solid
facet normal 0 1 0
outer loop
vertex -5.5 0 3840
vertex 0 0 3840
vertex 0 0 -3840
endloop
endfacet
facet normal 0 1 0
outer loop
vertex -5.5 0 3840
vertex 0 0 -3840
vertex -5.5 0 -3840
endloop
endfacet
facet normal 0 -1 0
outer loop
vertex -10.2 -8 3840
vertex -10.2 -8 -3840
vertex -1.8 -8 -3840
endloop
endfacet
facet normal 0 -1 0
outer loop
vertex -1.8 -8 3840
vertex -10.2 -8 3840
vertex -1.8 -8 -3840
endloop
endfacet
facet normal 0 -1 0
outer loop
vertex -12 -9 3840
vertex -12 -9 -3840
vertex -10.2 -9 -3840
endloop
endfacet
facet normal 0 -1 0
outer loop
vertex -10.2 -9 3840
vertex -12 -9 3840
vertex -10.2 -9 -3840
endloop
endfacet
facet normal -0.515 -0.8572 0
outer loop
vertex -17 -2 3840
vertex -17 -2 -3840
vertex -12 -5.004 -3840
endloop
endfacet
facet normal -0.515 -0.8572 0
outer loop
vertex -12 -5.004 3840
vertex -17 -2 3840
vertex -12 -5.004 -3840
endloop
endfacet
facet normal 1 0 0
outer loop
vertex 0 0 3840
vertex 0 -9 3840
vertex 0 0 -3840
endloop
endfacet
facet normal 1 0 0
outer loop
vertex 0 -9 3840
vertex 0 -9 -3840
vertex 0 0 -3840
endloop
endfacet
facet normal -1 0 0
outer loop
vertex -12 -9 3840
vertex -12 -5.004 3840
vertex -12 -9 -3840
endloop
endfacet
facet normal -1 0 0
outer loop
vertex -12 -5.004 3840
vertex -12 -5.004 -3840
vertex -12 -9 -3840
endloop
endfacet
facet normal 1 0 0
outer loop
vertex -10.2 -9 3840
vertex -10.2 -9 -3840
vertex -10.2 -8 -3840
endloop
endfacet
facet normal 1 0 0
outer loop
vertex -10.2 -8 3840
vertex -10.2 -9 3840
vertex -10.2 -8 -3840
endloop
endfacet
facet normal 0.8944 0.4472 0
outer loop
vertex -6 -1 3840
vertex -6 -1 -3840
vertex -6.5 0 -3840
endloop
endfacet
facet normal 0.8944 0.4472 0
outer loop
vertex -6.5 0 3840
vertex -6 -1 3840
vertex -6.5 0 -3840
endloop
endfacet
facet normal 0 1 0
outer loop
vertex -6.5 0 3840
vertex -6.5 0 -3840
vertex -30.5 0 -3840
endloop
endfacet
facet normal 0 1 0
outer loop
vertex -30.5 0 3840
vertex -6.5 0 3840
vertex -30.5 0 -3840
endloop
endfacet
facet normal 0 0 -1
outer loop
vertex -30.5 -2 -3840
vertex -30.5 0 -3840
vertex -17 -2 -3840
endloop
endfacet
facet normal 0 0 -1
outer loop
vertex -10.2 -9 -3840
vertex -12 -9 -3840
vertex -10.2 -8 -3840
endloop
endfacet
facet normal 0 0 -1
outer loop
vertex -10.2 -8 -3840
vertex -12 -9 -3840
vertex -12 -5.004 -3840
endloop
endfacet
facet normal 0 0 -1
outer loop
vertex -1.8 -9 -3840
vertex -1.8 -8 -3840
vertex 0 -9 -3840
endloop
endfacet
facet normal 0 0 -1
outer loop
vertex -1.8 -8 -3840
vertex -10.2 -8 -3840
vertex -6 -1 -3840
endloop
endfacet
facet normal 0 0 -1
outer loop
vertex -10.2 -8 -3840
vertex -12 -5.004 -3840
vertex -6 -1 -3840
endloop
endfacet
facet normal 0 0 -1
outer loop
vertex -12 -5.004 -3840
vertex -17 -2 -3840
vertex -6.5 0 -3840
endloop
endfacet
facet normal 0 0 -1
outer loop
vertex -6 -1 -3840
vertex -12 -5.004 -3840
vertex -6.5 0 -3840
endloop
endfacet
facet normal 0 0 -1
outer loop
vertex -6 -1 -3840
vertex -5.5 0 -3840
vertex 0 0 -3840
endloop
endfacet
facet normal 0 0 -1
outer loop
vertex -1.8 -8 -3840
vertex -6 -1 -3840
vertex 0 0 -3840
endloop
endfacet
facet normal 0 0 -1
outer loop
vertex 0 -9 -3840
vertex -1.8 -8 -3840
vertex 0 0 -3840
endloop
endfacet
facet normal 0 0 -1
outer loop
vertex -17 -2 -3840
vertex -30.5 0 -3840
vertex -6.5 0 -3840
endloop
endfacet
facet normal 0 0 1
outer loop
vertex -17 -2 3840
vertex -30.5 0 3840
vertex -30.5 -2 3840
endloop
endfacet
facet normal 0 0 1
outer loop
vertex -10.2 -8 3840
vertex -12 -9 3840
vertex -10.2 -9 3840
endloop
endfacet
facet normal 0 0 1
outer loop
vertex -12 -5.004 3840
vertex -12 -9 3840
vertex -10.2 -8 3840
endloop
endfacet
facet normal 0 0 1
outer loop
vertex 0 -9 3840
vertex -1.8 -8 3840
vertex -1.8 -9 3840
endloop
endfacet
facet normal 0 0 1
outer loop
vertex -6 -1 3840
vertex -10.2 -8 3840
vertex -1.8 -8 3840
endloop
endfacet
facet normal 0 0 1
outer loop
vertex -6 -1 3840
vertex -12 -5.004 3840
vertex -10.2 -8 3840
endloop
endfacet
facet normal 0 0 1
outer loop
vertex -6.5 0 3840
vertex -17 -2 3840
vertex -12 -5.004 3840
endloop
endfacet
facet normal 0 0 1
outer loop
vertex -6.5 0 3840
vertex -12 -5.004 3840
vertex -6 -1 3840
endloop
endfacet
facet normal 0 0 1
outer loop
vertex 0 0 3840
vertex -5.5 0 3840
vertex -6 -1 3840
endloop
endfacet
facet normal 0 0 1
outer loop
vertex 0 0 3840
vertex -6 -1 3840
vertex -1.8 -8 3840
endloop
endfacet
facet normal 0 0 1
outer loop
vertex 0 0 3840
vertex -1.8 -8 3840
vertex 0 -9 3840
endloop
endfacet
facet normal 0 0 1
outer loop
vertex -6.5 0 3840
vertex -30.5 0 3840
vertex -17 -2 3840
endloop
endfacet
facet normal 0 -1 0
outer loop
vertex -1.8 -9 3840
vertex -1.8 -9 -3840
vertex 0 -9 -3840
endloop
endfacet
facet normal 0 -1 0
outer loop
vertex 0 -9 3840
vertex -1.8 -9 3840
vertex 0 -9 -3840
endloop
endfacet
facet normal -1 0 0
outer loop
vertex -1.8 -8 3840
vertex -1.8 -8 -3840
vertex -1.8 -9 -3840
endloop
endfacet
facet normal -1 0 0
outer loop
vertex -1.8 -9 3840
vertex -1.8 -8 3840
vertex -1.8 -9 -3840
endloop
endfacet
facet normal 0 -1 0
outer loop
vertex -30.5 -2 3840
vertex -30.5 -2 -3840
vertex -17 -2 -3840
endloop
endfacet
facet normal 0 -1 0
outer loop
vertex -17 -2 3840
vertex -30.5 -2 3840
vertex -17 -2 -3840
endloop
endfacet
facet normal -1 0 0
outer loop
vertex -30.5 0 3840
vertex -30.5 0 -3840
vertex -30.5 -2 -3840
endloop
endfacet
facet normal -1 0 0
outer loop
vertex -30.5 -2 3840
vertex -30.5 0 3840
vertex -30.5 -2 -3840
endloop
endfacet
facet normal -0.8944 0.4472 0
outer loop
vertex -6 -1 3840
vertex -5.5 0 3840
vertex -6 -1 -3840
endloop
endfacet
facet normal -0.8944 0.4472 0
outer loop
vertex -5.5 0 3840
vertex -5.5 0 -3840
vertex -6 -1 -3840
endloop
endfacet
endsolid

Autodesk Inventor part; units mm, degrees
ref_plane "YZ Plane" through (0, 0, 0) normal (1, 0, 0) x (0, 1, 0)
ref_plane "XZ Plane" through (0, 0, 0) normal (0, 1, 0) x (-1, 0, 0)
ref_plane "XY Plane" through (0, 0, 0) normal (0, 0, 1) x (1, 0, 0)
sketch "스케치9" plane through (0, 0, 0) normal (0, 0, 1) x (1, 0, 0)
  line L0 (-10.2, -9) -> (-10.2, -8)
  line L1 (-10.2, -8) -> (-1.8, -8)
  line L2 (-1.8, -8) -> (-1.8, -9)
  line L3 (-1.8, -9) -> (0, -9)
  line L4 (0, -9) -> (0, 0)
  line L5 (0, 0) -> (-5.5, 0)
  line L6 (-5.5, 0) -> (-6, -1)
  line L7 (-6, -1) -> (-6.5, 0)
  line L8 (-6.5, 0) -> (-30.5, 0)
  line L9 (-30.5, 0) -> (-30.5, -2)
  line L10 (-30.5, -2) -> (-17, -2)
  line L11 (-17, -2) -> (-12, -5.0043)
  line L12 (-12, -5.0043) -> (-12, -9)
  line L13 (-12, -9) -> (-10.2, -9)
  point P0 (0, 0)
  dimension "d42" = 9
  dimension "d45" = 30.5
extrude "돌출4" add sketch "스케치9" along normal mid plane 7680
equation "\"d46\" = L1 + L2"
equation "\"L1\" = 6000"
equation "\"L2\" = 1680"
properties part number "TL20240701-10100CV-DY1055" material "AL6061"
